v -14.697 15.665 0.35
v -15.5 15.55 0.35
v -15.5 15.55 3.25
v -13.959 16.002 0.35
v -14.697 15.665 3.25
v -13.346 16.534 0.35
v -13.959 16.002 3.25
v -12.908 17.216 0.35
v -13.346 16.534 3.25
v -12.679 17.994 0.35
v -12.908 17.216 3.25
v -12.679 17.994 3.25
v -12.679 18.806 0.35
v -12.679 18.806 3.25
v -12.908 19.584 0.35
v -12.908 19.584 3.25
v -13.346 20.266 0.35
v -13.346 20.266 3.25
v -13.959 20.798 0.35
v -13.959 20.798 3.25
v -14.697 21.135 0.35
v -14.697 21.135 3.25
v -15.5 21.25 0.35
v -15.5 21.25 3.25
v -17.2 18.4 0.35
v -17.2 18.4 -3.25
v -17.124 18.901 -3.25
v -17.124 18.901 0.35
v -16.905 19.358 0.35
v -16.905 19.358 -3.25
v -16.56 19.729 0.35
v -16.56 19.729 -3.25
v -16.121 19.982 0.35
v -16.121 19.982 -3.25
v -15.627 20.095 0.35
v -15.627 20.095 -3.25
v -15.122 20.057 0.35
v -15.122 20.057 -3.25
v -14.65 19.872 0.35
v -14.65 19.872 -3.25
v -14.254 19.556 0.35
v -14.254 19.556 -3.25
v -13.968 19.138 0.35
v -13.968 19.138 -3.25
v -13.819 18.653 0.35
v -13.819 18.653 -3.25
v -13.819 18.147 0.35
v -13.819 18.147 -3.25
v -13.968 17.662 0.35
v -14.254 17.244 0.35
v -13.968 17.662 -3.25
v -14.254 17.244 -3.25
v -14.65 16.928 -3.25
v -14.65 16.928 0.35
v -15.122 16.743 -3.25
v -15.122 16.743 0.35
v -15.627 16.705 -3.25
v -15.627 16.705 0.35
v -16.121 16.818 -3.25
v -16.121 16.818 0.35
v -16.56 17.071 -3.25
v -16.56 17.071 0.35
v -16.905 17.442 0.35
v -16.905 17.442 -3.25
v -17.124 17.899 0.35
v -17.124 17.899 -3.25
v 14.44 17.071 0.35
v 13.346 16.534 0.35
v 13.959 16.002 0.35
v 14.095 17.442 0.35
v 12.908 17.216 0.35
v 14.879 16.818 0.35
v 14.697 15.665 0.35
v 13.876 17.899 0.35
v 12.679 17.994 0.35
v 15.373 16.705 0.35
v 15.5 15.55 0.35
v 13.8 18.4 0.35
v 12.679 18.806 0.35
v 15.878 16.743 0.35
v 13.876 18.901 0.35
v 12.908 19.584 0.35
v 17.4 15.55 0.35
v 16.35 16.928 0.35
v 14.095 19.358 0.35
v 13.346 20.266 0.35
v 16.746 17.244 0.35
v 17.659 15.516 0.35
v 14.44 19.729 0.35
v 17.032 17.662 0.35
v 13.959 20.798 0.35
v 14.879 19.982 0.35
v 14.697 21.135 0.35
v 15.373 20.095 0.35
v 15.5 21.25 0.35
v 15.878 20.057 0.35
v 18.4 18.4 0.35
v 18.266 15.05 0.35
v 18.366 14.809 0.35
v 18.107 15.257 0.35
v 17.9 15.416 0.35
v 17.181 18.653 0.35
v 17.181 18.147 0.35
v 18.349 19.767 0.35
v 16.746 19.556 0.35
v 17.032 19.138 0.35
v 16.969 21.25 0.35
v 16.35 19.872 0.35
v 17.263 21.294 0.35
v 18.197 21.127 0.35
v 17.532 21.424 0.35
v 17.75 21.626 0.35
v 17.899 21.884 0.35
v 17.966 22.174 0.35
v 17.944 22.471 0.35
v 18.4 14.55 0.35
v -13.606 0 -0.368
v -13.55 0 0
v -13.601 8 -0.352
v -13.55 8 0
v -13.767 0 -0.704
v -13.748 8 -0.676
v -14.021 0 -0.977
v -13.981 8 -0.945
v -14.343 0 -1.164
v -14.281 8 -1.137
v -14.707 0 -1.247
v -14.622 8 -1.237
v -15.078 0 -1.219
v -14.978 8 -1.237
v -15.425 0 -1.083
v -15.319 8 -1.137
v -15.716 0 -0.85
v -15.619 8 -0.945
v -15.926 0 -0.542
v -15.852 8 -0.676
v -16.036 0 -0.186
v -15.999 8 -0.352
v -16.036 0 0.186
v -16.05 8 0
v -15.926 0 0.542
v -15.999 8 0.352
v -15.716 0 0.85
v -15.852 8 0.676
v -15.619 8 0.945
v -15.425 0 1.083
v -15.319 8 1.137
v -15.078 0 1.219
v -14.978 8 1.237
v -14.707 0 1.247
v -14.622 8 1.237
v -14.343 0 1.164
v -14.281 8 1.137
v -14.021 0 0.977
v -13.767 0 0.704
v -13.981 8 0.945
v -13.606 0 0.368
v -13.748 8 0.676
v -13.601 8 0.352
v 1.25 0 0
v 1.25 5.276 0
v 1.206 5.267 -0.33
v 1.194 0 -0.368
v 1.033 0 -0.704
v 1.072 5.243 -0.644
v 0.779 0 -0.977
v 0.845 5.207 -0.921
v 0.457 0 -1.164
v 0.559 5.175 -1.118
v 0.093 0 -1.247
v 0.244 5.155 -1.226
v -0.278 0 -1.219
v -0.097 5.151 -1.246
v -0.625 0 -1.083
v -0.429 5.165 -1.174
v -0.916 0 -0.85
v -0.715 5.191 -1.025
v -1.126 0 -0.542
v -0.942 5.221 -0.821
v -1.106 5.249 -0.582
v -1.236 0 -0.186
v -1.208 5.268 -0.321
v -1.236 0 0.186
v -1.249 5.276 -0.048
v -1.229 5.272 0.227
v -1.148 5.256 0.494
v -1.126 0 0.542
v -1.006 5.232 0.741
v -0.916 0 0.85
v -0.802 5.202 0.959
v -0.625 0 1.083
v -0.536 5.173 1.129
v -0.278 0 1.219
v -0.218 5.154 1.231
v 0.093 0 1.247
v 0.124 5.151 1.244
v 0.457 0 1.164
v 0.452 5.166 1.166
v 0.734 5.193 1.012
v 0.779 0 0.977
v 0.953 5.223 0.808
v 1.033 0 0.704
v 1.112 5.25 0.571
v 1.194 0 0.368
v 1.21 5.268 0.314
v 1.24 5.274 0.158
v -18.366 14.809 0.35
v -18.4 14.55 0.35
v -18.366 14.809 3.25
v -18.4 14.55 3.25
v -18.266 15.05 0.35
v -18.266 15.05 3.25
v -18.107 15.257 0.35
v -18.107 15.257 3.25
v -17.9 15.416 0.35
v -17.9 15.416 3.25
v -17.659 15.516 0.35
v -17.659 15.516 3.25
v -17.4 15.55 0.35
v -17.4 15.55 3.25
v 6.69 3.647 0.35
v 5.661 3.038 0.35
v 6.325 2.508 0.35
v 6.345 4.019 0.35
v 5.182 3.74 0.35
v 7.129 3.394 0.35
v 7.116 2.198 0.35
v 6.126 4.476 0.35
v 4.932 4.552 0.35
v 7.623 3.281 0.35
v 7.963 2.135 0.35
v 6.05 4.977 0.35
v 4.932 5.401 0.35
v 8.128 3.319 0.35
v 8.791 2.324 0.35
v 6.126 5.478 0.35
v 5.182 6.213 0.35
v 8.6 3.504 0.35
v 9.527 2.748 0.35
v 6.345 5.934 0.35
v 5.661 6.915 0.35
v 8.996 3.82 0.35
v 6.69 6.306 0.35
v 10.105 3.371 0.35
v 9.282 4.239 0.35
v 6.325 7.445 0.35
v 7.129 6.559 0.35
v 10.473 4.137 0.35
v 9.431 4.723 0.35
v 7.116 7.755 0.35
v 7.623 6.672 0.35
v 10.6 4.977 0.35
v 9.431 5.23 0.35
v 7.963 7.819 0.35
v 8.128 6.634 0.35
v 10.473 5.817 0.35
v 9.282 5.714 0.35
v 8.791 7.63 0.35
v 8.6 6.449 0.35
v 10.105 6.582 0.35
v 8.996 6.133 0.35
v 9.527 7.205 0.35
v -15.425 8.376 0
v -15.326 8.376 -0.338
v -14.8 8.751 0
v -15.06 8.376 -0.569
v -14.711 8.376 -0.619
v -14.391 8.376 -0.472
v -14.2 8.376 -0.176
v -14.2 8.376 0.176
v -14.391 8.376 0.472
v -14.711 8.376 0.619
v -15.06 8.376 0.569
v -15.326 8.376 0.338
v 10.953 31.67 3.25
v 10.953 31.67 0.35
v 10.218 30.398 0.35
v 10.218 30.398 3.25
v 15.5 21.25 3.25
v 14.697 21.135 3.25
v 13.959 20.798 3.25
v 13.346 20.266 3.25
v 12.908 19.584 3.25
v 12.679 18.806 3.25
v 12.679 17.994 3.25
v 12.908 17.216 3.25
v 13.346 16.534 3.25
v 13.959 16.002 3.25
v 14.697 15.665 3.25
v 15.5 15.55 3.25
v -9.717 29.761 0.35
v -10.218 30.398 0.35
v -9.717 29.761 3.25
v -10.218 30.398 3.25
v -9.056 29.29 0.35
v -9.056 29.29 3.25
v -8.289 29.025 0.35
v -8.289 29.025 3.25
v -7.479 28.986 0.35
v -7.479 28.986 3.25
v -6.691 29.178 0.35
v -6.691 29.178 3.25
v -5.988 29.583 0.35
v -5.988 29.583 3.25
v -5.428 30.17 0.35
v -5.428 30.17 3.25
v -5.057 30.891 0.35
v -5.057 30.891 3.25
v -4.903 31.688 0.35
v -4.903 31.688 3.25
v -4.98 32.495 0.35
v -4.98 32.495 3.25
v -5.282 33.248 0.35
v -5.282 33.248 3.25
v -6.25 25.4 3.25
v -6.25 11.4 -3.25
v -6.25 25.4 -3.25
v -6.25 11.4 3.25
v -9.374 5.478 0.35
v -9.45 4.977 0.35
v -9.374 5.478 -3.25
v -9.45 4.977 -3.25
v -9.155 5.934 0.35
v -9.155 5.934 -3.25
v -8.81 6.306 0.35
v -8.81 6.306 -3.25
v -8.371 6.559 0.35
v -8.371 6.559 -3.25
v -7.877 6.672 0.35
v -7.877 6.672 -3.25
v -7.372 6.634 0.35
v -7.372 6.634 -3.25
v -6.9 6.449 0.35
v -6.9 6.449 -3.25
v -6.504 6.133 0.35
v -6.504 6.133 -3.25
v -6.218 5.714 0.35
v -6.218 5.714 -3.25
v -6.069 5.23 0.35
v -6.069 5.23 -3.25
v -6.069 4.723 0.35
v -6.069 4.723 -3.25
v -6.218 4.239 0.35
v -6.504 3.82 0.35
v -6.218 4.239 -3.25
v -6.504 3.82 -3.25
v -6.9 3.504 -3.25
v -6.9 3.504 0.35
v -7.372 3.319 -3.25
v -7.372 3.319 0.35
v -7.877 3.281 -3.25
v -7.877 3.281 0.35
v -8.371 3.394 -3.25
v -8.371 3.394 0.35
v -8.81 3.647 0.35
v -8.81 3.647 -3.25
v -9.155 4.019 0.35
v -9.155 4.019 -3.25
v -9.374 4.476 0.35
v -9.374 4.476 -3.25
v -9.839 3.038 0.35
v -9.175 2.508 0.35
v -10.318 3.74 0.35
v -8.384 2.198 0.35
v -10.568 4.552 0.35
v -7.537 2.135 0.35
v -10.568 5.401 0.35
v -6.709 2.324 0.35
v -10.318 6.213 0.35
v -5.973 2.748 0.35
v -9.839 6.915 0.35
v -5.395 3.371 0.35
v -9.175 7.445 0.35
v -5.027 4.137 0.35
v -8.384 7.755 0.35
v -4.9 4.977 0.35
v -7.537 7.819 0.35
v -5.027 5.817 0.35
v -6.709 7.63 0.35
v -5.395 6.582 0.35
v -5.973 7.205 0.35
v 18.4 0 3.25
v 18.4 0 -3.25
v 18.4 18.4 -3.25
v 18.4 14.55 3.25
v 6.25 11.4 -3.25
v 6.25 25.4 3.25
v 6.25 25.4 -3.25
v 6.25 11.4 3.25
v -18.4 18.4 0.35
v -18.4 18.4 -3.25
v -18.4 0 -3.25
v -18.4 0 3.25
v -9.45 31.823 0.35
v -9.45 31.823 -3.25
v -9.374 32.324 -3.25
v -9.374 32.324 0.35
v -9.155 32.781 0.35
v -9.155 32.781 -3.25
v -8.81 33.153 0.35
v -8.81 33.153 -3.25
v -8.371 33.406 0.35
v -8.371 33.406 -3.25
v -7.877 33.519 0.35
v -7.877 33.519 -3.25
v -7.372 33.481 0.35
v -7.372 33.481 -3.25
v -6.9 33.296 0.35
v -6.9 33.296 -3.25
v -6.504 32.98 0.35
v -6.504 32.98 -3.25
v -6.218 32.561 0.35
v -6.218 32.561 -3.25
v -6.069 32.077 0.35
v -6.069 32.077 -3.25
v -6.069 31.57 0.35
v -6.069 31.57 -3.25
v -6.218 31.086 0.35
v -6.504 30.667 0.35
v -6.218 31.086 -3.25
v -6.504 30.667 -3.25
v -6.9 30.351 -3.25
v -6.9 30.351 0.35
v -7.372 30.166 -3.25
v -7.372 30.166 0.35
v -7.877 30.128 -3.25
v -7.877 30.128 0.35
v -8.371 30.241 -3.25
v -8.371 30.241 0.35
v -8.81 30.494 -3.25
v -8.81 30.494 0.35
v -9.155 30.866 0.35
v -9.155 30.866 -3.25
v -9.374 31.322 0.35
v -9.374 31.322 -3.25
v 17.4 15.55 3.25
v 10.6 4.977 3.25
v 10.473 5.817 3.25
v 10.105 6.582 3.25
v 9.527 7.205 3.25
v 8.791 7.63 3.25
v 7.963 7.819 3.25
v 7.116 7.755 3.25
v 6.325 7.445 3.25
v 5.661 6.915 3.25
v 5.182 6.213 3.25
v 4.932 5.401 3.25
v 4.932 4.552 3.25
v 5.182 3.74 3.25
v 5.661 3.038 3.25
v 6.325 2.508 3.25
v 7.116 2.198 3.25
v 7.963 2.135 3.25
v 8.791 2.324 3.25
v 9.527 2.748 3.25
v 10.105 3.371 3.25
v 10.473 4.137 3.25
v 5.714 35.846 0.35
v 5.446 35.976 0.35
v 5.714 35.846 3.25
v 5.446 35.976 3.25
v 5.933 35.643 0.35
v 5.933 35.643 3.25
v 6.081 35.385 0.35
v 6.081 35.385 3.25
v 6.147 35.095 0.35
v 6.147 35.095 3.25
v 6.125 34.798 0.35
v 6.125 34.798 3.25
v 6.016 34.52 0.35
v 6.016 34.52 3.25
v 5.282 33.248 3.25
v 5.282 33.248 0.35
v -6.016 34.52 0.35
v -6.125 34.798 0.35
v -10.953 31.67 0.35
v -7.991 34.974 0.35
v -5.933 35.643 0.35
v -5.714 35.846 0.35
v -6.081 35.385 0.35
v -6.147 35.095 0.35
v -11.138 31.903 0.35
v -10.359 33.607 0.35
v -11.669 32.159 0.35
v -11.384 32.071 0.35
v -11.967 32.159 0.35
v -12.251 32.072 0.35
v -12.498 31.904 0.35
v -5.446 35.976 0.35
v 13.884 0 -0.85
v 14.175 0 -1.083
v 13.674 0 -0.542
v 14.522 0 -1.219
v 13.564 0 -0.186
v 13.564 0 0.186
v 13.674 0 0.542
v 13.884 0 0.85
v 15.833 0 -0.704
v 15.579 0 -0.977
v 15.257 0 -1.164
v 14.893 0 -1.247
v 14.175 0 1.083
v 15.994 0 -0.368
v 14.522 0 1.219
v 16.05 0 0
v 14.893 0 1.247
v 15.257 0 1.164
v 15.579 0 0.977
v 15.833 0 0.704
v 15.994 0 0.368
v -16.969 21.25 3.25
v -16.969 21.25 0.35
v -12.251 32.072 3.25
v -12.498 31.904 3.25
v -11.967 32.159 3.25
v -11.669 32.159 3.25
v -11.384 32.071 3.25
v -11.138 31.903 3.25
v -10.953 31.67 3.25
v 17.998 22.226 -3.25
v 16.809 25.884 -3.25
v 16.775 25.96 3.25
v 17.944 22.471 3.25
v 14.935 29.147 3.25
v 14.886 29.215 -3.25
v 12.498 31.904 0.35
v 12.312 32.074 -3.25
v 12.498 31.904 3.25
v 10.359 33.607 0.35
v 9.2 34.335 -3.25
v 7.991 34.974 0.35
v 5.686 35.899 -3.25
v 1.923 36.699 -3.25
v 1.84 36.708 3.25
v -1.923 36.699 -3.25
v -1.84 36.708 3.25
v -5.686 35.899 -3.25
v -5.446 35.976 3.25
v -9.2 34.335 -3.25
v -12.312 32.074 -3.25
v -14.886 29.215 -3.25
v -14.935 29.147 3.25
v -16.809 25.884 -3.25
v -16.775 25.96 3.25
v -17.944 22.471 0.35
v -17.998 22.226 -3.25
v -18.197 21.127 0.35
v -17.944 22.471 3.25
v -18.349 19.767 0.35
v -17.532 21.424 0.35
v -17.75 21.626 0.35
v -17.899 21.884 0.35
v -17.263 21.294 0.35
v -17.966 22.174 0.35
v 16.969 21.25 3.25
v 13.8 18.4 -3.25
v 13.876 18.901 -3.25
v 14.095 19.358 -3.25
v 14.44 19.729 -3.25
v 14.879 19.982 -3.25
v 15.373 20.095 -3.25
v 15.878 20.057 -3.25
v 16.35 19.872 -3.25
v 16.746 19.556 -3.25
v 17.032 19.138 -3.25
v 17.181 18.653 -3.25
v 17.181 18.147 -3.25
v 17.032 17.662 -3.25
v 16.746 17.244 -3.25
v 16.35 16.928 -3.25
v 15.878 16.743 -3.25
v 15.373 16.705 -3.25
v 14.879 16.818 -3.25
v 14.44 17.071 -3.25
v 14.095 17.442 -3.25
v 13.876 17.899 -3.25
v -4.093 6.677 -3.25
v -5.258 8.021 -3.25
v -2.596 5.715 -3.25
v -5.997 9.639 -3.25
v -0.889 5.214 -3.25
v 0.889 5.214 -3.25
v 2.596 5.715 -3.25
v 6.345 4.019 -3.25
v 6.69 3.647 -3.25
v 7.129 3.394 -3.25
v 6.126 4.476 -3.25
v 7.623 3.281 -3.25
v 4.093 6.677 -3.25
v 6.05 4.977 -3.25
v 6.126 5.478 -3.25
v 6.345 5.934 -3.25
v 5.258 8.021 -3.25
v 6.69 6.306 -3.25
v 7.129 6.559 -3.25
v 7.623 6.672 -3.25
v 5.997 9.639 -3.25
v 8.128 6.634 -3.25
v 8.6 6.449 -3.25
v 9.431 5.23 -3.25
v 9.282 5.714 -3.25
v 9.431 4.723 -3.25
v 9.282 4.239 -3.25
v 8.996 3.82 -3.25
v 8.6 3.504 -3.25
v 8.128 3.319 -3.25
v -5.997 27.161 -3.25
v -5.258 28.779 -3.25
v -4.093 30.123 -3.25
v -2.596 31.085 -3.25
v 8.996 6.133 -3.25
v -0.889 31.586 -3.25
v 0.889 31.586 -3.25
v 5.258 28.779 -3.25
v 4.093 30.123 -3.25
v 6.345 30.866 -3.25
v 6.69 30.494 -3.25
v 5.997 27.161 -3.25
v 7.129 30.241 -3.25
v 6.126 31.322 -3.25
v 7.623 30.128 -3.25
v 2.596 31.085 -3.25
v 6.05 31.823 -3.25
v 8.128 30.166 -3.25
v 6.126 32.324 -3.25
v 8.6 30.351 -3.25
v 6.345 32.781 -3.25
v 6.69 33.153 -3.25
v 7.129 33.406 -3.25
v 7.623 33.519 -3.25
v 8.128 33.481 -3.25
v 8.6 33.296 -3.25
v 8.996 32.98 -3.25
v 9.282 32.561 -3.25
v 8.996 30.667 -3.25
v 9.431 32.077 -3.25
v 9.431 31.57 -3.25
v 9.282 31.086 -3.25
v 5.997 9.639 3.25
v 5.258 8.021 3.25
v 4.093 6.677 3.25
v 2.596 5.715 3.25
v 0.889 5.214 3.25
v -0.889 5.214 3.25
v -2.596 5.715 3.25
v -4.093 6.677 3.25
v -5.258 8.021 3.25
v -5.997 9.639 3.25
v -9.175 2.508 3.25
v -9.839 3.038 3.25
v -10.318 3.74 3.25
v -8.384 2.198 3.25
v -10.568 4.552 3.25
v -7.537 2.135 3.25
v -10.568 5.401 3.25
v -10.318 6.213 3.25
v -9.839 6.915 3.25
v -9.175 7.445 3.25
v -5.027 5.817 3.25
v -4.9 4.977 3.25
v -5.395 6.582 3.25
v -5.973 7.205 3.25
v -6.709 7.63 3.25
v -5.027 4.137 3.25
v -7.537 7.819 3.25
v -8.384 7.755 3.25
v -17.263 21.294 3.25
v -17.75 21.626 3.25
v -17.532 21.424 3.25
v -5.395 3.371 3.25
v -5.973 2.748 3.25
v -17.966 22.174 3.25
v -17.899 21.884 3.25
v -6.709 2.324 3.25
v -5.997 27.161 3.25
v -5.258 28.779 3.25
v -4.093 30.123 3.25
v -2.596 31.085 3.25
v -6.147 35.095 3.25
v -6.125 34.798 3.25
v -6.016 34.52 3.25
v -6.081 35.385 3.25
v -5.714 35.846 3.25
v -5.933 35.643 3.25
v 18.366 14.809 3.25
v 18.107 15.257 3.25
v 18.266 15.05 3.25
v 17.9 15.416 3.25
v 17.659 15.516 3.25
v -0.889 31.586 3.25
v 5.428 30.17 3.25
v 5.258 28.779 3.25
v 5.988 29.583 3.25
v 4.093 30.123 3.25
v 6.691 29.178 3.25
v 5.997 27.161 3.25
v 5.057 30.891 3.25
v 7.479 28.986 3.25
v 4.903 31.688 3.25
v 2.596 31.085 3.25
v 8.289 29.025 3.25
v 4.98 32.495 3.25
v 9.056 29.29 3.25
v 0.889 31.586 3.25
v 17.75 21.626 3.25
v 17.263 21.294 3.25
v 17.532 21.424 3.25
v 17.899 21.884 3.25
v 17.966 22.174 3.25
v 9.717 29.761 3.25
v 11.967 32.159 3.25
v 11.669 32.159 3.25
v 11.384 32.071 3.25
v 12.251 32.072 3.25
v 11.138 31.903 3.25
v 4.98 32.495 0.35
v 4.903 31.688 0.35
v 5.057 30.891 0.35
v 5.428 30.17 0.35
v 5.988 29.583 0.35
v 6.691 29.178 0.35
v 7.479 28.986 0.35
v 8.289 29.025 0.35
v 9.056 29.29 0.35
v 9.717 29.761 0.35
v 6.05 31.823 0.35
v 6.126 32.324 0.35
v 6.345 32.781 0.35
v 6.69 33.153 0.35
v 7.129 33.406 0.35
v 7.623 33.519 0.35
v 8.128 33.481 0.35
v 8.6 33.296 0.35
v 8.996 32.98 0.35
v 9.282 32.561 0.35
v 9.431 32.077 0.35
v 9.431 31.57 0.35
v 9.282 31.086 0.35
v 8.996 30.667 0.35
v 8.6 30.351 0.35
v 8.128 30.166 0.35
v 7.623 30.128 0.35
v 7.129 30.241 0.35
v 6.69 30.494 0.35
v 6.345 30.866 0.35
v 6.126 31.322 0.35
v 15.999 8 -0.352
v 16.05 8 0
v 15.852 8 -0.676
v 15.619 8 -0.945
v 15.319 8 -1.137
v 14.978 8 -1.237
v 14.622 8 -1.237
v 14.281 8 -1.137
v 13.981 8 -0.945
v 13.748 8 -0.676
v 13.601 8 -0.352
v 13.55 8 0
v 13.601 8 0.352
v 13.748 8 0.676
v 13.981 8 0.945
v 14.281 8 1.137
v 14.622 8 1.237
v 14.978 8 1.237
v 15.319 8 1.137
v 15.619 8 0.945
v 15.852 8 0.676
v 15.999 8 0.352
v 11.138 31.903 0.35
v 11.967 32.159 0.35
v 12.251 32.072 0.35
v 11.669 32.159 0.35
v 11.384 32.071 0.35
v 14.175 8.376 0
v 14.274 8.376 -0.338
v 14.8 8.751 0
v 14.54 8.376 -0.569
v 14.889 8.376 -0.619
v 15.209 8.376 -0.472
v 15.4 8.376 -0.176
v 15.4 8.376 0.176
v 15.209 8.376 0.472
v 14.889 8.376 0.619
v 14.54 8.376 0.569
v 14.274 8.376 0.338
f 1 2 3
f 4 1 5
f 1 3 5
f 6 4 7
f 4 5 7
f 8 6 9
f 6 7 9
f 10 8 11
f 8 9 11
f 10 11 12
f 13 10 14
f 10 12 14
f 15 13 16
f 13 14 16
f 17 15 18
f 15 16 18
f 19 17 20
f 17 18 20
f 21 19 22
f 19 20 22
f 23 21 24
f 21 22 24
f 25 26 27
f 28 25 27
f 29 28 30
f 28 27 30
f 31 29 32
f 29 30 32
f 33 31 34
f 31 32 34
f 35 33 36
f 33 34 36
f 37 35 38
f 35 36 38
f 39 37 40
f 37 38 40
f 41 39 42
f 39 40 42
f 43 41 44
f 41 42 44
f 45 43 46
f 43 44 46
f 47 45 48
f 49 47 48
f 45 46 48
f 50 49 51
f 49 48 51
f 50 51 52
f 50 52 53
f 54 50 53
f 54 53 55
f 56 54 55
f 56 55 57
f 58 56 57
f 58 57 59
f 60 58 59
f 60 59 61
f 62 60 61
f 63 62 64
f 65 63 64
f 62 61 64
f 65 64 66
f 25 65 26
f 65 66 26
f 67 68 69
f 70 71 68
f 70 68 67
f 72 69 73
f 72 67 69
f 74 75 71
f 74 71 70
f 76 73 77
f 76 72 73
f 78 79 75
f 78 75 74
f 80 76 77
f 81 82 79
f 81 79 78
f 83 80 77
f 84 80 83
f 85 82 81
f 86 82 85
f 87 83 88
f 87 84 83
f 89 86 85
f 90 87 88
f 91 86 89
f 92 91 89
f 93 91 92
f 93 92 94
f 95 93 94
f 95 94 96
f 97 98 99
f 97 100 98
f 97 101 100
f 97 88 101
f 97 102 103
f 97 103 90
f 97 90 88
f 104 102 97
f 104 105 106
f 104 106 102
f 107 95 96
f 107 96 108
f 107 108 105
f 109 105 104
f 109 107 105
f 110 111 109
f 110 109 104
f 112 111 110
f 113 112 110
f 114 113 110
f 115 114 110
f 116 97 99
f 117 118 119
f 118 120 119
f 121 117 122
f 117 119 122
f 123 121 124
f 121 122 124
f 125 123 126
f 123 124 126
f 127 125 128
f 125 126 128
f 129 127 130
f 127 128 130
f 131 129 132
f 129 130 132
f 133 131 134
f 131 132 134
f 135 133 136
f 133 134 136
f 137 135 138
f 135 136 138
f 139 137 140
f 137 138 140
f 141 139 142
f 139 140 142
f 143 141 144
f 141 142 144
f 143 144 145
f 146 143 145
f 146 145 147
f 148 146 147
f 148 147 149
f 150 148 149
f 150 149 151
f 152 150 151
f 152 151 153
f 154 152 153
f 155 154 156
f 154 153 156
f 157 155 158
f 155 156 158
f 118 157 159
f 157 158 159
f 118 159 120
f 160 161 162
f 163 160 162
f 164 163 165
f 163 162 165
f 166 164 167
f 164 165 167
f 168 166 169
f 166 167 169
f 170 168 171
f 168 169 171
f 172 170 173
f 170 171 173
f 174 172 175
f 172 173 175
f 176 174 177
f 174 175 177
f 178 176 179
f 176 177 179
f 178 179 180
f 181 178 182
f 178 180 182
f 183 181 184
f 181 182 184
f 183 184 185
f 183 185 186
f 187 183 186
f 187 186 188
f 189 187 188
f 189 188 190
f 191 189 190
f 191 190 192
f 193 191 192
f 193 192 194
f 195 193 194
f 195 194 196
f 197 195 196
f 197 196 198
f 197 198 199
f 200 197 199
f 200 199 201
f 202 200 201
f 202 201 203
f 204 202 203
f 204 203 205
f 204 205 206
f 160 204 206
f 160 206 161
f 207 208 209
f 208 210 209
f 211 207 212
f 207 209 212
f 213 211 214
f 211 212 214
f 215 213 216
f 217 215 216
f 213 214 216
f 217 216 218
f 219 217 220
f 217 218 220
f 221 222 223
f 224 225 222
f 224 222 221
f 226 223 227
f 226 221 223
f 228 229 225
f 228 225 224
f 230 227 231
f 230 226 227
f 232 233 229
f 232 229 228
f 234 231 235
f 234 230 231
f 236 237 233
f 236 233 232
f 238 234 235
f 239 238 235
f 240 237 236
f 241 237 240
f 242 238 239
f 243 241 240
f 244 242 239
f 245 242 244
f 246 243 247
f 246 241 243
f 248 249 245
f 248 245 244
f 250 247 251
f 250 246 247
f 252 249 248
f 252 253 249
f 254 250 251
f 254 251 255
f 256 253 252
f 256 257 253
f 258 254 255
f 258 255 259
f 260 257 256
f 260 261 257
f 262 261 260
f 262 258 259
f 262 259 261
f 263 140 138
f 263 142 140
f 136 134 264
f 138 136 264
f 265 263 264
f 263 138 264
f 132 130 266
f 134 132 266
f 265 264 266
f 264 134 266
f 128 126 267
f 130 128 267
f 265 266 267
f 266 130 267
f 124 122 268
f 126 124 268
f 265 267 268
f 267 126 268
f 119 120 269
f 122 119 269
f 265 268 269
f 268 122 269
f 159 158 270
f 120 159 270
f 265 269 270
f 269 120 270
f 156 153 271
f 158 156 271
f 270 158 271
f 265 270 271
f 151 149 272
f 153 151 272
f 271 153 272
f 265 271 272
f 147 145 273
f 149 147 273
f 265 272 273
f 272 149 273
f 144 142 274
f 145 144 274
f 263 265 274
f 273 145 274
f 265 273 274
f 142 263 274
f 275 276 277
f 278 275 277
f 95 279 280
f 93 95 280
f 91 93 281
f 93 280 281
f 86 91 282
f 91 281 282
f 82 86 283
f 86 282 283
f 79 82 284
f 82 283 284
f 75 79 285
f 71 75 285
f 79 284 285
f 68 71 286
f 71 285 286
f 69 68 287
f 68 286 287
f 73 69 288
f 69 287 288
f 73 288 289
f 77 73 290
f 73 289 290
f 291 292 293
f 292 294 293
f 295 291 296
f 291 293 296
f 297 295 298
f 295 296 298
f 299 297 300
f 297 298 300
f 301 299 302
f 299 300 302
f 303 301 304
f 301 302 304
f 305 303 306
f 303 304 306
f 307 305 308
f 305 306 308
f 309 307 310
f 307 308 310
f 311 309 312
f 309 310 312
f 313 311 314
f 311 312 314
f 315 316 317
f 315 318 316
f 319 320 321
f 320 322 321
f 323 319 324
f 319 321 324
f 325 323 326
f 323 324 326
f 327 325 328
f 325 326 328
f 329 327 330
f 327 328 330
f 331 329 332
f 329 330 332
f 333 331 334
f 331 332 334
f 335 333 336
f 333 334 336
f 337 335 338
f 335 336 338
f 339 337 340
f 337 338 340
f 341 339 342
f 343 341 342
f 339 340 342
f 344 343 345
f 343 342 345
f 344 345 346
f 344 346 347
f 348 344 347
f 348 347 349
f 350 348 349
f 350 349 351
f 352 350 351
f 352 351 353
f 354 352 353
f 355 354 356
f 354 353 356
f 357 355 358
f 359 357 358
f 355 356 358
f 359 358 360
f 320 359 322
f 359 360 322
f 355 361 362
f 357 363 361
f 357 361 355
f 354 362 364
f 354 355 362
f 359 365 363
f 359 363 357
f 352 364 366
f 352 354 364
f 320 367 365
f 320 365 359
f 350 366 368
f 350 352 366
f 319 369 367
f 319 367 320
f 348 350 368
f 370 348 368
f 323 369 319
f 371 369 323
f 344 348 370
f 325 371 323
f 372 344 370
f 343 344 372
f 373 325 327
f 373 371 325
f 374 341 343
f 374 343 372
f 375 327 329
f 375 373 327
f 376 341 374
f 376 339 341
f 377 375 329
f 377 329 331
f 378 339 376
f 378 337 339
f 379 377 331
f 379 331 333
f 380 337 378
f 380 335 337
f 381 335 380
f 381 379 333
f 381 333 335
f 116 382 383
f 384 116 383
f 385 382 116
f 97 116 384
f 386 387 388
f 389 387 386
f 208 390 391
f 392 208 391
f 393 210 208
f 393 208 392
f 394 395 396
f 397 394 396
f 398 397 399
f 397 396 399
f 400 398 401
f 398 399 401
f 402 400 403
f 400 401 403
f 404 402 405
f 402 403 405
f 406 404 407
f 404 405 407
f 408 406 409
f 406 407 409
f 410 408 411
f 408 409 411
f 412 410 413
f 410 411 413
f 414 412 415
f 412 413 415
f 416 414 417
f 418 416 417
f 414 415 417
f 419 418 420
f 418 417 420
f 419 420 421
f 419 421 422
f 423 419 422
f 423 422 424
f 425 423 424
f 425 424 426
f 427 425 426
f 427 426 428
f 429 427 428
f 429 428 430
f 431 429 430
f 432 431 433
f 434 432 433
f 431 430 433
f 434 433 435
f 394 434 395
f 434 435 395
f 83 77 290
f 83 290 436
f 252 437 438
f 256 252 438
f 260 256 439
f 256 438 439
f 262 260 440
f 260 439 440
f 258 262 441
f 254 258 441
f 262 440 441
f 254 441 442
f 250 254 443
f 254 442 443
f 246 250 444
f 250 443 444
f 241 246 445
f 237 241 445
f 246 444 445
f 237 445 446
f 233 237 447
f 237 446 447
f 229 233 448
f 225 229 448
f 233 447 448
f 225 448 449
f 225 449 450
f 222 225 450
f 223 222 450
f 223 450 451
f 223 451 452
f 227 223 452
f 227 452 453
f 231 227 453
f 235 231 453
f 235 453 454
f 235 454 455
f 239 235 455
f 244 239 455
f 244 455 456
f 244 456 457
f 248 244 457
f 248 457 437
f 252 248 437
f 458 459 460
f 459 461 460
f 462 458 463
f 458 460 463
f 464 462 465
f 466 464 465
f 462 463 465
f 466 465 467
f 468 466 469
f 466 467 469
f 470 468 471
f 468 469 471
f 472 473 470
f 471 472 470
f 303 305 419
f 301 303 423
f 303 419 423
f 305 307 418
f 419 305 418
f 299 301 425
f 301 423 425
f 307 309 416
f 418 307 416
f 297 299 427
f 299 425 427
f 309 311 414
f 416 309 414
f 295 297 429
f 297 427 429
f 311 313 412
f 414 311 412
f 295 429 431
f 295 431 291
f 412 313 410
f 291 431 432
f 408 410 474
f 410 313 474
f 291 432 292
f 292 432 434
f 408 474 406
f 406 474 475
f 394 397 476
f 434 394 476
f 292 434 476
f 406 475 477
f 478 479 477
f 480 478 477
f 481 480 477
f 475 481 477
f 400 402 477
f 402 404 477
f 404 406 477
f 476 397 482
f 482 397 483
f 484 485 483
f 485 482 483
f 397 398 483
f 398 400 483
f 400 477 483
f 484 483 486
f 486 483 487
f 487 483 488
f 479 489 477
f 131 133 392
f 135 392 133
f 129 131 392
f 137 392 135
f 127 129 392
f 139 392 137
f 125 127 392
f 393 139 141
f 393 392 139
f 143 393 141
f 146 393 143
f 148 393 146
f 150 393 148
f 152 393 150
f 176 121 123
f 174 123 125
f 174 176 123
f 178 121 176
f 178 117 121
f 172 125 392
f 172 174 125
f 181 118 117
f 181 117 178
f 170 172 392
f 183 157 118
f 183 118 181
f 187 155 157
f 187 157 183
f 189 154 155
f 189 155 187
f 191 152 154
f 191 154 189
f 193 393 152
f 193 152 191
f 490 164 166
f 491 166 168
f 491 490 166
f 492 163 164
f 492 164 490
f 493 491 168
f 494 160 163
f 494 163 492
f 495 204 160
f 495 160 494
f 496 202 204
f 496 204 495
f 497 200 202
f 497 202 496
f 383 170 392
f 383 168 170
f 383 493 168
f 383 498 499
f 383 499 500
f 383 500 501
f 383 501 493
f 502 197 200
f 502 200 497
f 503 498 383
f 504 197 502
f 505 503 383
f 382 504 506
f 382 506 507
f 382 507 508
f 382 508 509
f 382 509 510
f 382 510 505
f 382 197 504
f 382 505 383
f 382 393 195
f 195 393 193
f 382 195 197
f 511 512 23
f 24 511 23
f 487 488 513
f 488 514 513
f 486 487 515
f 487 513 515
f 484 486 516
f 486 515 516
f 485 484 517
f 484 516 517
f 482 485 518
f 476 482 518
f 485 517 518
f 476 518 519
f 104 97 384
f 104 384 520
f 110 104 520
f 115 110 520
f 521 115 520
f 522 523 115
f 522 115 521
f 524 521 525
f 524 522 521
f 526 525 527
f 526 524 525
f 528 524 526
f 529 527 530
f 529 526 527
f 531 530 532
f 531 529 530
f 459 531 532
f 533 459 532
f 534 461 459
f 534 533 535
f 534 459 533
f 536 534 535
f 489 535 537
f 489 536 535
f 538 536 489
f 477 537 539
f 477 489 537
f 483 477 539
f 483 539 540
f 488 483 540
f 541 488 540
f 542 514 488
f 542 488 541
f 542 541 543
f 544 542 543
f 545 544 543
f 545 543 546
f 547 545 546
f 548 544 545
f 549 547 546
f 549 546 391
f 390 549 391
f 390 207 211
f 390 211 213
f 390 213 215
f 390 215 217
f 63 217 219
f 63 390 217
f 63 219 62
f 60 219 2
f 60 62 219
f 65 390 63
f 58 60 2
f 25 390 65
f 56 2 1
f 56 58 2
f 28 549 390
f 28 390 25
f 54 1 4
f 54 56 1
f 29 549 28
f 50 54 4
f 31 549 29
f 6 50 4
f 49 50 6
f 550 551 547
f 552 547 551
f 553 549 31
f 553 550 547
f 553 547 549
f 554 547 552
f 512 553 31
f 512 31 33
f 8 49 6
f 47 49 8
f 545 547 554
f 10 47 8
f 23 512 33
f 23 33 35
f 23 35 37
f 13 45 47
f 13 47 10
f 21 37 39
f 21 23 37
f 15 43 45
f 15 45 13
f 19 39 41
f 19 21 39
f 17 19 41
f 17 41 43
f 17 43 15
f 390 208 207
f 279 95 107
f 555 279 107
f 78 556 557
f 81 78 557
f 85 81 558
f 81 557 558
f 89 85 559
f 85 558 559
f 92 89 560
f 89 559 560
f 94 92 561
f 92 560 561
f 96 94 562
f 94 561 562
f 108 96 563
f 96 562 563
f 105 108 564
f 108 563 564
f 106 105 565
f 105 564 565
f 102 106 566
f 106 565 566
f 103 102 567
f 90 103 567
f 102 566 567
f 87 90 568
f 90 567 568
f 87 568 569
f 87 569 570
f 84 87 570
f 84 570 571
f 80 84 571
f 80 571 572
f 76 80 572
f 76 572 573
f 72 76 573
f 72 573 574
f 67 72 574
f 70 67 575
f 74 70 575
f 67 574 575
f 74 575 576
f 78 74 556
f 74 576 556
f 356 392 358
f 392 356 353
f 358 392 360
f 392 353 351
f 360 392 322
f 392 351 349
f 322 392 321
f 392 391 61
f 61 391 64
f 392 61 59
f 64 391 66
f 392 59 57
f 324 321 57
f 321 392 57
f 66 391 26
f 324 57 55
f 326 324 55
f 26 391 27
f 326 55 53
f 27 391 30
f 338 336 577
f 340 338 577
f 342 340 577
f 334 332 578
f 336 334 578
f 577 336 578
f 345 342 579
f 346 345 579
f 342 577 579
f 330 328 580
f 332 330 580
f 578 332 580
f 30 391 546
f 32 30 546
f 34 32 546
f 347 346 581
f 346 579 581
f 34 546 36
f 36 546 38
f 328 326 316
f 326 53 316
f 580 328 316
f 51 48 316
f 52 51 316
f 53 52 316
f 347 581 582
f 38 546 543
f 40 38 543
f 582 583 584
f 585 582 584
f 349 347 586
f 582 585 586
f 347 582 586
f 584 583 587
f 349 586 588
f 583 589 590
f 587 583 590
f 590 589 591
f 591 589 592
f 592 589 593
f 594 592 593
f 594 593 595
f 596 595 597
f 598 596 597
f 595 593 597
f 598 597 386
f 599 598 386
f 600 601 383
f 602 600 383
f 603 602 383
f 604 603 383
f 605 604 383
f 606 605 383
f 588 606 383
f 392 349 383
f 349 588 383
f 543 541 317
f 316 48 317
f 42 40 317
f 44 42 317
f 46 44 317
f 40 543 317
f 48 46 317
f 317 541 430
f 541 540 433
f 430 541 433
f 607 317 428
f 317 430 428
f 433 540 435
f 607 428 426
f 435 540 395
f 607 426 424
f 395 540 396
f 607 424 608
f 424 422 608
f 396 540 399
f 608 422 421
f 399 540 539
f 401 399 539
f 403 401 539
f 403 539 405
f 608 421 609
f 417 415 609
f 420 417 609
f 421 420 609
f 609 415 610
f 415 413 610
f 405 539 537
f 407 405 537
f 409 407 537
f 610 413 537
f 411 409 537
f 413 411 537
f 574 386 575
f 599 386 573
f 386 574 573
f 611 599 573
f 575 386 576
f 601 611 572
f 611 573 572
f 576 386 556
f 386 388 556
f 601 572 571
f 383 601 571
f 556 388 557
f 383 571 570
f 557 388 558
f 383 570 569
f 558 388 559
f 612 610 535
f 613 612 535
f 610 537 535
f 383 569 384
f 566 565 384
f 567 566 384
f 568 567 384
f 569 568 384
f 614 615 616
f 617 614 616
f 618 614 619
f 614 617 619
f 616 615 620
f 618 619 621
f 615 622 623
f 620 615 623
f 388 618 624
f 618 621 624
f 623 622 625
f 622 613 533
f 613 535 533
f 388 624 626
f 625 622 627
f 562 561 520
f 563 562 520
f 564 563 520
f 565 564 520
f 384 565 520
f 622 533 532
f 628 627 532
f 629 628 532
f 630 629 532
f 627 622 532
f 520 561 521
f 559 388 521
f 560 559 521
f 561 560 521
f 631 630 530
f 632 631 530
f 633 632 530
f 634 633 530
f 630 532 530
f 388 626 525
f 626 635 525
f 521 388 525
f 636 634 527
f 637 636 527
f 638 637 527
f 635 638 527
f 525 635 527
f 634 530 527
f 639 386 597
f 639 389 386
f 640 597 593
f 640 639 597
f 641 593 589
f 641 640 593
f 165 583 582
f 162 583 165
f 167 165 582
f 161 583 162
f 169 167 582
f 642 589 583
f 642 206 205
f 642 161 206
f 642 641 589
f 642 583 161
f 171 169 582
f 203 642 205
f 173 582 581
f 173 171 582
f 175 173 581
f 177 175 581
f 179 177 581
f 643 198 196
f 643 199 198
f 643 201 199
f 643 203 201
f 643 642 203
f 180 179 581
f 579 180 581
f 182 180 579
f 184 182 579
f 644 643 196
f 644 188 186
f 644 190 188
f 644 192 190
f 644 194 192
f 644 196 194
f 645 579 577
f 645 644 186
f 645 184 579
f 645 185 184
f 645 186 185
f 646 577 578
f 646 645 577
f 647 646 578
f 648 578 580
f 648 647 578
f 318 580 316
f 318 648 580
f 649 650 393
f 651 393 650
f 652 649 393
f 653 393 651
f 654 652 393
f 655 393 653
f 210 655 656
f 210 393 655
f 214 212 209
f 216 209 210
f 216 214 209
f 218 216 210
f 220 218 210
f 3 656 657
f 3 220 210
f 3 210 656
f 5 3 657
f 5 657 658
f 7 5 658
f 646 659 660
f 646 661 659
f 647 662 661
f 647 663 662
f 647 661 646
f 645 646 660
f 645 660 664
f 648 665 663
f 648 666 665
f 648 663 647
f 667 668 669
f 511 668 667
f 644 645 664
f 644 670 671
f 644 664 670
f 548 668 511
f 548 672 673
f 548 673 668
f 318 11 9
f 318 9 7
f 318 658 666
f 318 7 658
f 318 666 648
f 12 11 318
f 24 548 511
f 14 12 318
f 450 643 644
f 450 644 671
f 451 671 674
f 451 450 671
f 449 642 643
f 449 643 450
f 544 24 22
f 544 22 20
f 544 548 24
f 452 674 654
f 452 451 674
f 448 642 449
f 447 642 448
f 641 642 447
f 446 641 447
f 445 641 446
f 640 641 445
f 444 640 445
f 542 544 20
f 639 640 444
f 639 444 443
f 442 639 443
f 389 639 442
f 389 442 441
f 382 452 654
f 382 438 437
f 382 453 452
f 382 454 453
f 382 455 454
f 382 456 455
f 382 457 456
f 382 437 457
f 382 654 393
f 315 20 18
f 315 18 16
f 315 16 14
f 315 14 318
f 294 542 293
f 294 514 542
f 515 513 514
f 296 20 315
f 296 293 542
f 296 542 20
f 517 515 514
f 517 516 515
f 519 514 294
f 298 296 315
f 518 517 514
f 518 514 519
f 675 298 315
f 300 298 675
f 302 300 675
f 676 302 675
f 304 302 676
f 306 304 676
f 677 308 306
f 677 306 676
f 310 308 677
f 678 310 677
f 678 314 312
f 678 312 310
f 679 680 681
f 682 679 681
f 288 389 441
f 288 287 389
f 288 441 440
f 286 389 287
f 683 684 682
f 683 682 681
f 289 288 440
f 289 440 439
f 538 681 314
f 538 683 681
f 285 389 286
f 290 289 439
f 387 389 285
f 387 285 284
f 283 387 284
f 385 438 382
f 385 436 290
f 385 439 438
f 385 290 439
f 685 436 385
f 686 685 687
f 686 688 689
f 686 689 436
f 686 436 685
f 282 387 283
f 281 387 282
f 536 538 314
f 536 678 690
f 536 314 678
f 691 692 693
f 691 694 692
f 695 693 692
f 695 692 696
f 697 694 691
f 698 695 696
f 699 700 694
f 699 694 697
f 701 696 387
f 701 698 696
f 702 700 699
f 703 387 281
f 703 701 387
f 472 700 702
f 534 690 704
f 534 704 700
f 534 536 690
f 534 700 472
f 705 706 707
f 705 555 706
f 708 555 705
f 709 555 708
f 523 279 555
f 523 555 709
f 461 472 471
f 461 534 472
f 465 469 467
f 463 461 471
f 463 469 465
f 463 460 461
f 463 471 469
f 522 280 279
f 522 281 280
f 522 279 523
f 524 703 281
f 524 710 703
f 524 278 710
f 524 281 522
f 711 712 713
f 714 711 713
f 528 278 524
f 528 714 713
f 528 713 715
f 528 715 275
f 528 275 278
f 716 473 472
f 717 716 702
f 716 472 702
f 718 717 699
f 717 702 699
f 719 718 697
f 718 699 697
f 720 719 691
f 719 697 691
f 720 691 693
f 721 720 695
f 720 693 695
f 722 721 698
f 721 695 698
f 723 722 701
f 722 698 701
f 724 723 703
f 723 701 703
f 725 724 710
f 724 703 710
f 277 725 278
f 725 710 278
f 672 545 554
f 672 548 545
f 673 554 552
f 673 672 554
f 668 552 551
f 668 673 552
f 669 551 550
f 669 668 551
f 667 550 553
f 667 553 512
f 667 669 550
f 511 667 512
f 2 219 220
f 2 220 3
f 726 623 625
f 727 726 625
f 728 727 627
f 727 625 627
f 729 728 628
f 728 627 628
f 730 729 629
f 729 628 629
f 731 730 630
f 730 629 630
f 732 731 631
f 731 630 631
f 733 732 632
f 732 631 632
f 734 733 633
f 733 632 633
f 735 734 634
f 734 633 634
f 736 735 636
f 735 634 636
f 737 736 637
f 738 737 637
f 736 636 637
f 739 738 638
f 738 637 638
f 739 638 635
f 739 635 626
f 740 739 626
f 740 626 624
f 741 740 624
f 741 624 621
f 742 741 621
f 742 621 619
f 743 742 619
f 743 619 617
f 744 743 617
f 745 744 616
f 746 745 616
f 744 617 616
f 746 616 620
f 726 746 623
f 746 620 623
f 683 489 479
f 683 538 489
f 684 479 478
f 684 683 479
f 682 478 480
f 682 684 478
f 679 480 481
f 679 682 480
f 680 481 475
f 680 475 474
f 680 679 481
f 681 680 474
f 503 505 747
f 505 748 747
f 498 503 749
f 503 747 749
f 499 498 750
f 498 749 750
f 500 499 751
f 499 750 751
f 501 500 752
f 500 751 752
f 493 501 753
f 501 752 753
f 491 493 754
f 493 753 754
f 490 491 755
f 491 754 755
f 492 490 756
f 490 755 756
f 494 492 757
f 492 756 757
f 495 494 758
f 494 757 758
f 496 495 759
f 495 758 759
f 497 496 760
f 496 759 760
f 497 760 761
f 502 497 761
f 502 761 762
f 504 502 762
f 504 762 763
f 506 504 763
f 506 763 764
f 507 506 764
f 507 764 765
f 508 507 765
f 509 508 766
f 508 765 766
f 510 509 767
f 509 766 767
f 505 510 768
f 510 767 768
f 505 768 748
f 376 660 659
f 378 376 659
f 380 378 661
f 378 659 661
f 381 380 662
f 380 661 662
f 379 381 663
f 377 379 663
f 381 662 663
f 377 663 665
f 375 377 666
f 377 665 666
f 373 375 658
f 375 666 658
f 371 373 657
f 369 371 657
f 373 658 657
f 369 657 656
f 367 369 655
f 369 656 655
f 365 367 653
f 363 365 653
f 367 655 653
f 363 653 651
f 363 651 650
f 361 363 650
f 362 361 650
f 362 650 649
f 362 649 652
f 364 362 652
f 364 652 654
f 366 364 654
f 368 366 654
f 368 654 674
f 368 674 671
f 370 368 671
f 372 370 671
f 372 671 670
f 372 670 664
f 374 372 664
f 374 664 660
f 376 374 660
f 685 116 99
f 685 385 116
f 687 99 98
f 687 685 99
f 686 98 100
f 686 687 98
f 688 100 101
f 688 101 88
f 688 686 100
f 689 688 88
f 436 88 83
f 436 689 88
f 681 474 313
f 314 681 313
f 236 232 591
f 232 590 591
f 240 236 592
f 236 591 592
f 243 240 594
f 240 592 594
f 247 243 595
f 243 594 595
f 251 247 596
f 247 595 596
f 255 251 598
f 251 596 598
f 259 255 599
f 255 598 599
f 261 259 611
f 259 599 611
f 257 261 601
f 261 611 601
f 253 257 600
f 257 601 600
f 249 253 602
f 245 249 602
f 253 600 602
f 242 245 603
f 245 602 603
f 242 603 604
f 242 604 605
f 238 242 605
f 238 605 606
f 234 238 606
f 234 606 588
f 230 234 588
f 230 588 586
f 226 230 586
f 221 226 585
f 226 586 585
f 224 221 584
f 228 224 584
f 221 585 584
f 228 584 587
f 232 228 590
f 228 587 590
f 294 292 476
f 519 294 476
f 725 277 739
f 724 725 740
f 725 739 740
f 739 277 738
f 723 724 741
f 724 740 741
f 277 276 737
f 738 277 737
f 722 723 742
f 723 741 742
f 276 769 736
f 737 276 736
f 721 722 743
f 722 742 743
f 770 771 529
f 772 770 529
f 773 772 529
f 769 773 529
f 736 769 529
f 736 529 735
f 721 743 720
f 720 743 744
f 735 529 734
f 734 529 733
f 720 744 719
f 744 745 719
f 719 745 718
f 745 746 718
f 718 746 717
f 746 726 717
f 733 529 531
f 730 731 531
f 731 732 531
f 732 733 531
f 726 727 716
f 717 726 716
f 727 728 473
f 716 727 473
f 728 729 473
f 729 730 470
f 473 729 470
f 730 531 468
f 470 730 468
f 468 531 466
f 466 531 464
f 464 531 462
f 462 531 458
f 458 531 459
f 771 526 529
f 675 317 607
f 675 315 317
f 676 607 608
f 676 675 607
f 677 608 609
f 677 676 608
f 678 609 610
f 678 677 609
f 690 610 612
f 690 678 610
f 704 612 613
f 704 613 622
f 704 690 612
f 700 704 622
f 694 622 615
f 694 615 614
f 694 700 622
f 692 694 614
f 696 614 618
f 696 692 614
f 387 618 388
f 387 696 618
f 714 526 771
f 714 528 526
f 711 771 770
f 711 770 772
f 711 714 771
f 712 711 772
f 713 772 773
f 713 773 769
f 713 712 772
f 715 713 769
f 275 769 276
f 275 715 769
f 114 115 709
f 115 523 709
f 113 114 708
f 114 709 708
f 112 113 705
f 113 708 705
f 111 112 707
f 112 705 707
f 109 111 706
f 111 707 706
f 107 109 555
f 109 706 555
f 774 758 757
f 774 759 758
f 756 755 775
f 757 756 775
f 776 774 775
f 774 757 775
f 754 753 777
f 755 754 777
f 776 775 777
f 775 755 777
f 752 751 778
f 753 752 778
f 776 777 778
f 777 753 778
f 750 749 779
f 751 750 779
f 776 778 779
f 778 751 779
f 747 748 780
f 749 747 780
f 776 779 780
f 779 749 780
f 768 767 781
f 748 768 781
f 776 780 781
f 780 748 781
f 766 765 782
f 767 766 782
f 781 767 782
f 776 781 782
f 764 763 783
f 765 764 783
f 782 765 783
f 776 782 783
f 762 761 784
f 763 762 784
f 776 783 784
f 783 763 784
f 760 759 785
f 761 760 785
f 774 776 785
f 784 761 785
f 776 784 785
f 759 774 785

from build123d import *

# Parameters (mm, degrees)
BOSS_EXTRUDE1_DEPTH             = 3.25
CBORE_FOR_M3_SBHCS1_D           = 3.4
CBORE_FOR_M3_SBHCS1_CBORE_D     = 5.7
CBORE_FOR_M3_SBHCS1_CBORE_DEPTH = 2.9
SKETCH6_W                       = 2.9
SKETCH6_H                       = 5.7
CUT_EXTRUDE1_DEPTH              = 42.300847449
M3X0_5_TAPPED_HOLE1_D           = 2.5
M3X0_5_TAPPED_HOLE1_DEPTH       = 8
M3X0_5_TAPPED_HOLE1_TIP         = 0.751075774
FILLET1_R                       = 1


with BuildPart() as part:
    # Sketch1 → Boss-Extrude1 (new, symmetric)
    with BuildSketch(Plane.XY):
        with BuildLine():
            Line((-18.4, 18.4), (-18.4, 0))
            Line((-18.4, 0), (18.4, 0))
            Line((18.4, 0), (18.4, 18.4))
            ThreePointArc((18.4, 18.4), (0, 36.8), (-18.4, 18.4))
        make_face()
        with BuildLine():
            Line((6.25, 25.4), (6.25, 11.4))
            ThreePointArc((6.25, 11.4), (0, 5.15), (-6.25, 11.4))
            Line((-6.25, 11.4), (-6.25, 25.4))
            ThreePointArc((-6.25, 25.4), (0, 31.65), (6.25, 25.4))
        make_face(mode=Mode.SUBTRACT)
    extrude(amount=BOSS_EXTRUDE1_DEPTH, both=True)

    # CBORE for M3 SBHCS1 (through all)
    with Locations(Plane.XY.offset(3.25)):
        with Locations((7.75, 4.976606241), (15.5, 18.4), (7.75, 31.823393759), (-7.75, 31.823393759), (-15.5, 18.4), (-7.75, 4.976606241)):
            CounterBoreHole(CBORE_FOR_M3_SBHCS1_D / 2, CBORE_FOR_M3_SBHCS1_CBORE_D / 2, CBORE_FOR_M3_SBHCS1_CBORE_DEPTH)

    # Sketch6 → Cut-Extrude1 (cut, through all)
    with BuildSketch(Plane.XY.offset(0.35)):
        with Locations((-16.95, 18.4)):
            Rectangle(SKETCH6_W, SKETCH6_H)
        with Locations((16.95, 18.4)):
            Rectangle(SKETCH6_W, SKETCH6_H)
        Polygon((-10.218172401, 30.398393759), (-11.674711226, 32.921193007), (-6.725476951, 35.748867784), (-5.281827599, 33.248393759), align=None)
        Polygon((5.281827599, 33.248393759), (6.731827599, 35.75986743), (11.668172401, 32.90986743), (10.218172401, 30.398393759), align=None)
    extrude(amount=CUT_EXTRUDE1_DEPTH, mode=Mode.SUBTRACT)

    # M3x0.5 Tapped Hole1
    with Locations(Plane(origin=(0, 0, 0), x_dir=(-1, 0, 0), z_dir=(0, -1, 0))):
        with Locations((14.8, 0), (0, 0), (-14.8, 0)):
            Hole(M3X0_5_TAPPED_HOLE1_D / 2, depth=M3X0_5_TAPPED_HOLE1_DEPTH)
            with Locations((0, 0, -(M3X0_5_TAPPED_HOLE1_DEPTH + M3X0_5_TAPPED_HOLE1_TIP / 2))):  # 118° drill point
                Cone(0, M3X0_5_TAPPED_HOLE1_D / 2, M3X0_5_TAPPED_HOLE1_TIP, mode=Mode.SUBTRACT)

    # Fillet1
    fillet1_edges = [part.edges().sort_by_distance(p)[0] for p in [
        (-18.177939927, 21.25, 1.8),
        (-18.4, 15.55, 1.8),
        (11.557142364, 32.717557765, 1.8),
        (6.620797563, 35.567557765, 1.8),
        (-6.620797563, 35.567557765, 1.8),
        (-11.557142364, 32.717557765, 1.8),
        (18.4, 15.55, 1.8),
        (18.177939927, 21.25, 1.8),
    ]]
    fillet(fillet1_edges, radius=FILLET1_R)


solid = part.part
